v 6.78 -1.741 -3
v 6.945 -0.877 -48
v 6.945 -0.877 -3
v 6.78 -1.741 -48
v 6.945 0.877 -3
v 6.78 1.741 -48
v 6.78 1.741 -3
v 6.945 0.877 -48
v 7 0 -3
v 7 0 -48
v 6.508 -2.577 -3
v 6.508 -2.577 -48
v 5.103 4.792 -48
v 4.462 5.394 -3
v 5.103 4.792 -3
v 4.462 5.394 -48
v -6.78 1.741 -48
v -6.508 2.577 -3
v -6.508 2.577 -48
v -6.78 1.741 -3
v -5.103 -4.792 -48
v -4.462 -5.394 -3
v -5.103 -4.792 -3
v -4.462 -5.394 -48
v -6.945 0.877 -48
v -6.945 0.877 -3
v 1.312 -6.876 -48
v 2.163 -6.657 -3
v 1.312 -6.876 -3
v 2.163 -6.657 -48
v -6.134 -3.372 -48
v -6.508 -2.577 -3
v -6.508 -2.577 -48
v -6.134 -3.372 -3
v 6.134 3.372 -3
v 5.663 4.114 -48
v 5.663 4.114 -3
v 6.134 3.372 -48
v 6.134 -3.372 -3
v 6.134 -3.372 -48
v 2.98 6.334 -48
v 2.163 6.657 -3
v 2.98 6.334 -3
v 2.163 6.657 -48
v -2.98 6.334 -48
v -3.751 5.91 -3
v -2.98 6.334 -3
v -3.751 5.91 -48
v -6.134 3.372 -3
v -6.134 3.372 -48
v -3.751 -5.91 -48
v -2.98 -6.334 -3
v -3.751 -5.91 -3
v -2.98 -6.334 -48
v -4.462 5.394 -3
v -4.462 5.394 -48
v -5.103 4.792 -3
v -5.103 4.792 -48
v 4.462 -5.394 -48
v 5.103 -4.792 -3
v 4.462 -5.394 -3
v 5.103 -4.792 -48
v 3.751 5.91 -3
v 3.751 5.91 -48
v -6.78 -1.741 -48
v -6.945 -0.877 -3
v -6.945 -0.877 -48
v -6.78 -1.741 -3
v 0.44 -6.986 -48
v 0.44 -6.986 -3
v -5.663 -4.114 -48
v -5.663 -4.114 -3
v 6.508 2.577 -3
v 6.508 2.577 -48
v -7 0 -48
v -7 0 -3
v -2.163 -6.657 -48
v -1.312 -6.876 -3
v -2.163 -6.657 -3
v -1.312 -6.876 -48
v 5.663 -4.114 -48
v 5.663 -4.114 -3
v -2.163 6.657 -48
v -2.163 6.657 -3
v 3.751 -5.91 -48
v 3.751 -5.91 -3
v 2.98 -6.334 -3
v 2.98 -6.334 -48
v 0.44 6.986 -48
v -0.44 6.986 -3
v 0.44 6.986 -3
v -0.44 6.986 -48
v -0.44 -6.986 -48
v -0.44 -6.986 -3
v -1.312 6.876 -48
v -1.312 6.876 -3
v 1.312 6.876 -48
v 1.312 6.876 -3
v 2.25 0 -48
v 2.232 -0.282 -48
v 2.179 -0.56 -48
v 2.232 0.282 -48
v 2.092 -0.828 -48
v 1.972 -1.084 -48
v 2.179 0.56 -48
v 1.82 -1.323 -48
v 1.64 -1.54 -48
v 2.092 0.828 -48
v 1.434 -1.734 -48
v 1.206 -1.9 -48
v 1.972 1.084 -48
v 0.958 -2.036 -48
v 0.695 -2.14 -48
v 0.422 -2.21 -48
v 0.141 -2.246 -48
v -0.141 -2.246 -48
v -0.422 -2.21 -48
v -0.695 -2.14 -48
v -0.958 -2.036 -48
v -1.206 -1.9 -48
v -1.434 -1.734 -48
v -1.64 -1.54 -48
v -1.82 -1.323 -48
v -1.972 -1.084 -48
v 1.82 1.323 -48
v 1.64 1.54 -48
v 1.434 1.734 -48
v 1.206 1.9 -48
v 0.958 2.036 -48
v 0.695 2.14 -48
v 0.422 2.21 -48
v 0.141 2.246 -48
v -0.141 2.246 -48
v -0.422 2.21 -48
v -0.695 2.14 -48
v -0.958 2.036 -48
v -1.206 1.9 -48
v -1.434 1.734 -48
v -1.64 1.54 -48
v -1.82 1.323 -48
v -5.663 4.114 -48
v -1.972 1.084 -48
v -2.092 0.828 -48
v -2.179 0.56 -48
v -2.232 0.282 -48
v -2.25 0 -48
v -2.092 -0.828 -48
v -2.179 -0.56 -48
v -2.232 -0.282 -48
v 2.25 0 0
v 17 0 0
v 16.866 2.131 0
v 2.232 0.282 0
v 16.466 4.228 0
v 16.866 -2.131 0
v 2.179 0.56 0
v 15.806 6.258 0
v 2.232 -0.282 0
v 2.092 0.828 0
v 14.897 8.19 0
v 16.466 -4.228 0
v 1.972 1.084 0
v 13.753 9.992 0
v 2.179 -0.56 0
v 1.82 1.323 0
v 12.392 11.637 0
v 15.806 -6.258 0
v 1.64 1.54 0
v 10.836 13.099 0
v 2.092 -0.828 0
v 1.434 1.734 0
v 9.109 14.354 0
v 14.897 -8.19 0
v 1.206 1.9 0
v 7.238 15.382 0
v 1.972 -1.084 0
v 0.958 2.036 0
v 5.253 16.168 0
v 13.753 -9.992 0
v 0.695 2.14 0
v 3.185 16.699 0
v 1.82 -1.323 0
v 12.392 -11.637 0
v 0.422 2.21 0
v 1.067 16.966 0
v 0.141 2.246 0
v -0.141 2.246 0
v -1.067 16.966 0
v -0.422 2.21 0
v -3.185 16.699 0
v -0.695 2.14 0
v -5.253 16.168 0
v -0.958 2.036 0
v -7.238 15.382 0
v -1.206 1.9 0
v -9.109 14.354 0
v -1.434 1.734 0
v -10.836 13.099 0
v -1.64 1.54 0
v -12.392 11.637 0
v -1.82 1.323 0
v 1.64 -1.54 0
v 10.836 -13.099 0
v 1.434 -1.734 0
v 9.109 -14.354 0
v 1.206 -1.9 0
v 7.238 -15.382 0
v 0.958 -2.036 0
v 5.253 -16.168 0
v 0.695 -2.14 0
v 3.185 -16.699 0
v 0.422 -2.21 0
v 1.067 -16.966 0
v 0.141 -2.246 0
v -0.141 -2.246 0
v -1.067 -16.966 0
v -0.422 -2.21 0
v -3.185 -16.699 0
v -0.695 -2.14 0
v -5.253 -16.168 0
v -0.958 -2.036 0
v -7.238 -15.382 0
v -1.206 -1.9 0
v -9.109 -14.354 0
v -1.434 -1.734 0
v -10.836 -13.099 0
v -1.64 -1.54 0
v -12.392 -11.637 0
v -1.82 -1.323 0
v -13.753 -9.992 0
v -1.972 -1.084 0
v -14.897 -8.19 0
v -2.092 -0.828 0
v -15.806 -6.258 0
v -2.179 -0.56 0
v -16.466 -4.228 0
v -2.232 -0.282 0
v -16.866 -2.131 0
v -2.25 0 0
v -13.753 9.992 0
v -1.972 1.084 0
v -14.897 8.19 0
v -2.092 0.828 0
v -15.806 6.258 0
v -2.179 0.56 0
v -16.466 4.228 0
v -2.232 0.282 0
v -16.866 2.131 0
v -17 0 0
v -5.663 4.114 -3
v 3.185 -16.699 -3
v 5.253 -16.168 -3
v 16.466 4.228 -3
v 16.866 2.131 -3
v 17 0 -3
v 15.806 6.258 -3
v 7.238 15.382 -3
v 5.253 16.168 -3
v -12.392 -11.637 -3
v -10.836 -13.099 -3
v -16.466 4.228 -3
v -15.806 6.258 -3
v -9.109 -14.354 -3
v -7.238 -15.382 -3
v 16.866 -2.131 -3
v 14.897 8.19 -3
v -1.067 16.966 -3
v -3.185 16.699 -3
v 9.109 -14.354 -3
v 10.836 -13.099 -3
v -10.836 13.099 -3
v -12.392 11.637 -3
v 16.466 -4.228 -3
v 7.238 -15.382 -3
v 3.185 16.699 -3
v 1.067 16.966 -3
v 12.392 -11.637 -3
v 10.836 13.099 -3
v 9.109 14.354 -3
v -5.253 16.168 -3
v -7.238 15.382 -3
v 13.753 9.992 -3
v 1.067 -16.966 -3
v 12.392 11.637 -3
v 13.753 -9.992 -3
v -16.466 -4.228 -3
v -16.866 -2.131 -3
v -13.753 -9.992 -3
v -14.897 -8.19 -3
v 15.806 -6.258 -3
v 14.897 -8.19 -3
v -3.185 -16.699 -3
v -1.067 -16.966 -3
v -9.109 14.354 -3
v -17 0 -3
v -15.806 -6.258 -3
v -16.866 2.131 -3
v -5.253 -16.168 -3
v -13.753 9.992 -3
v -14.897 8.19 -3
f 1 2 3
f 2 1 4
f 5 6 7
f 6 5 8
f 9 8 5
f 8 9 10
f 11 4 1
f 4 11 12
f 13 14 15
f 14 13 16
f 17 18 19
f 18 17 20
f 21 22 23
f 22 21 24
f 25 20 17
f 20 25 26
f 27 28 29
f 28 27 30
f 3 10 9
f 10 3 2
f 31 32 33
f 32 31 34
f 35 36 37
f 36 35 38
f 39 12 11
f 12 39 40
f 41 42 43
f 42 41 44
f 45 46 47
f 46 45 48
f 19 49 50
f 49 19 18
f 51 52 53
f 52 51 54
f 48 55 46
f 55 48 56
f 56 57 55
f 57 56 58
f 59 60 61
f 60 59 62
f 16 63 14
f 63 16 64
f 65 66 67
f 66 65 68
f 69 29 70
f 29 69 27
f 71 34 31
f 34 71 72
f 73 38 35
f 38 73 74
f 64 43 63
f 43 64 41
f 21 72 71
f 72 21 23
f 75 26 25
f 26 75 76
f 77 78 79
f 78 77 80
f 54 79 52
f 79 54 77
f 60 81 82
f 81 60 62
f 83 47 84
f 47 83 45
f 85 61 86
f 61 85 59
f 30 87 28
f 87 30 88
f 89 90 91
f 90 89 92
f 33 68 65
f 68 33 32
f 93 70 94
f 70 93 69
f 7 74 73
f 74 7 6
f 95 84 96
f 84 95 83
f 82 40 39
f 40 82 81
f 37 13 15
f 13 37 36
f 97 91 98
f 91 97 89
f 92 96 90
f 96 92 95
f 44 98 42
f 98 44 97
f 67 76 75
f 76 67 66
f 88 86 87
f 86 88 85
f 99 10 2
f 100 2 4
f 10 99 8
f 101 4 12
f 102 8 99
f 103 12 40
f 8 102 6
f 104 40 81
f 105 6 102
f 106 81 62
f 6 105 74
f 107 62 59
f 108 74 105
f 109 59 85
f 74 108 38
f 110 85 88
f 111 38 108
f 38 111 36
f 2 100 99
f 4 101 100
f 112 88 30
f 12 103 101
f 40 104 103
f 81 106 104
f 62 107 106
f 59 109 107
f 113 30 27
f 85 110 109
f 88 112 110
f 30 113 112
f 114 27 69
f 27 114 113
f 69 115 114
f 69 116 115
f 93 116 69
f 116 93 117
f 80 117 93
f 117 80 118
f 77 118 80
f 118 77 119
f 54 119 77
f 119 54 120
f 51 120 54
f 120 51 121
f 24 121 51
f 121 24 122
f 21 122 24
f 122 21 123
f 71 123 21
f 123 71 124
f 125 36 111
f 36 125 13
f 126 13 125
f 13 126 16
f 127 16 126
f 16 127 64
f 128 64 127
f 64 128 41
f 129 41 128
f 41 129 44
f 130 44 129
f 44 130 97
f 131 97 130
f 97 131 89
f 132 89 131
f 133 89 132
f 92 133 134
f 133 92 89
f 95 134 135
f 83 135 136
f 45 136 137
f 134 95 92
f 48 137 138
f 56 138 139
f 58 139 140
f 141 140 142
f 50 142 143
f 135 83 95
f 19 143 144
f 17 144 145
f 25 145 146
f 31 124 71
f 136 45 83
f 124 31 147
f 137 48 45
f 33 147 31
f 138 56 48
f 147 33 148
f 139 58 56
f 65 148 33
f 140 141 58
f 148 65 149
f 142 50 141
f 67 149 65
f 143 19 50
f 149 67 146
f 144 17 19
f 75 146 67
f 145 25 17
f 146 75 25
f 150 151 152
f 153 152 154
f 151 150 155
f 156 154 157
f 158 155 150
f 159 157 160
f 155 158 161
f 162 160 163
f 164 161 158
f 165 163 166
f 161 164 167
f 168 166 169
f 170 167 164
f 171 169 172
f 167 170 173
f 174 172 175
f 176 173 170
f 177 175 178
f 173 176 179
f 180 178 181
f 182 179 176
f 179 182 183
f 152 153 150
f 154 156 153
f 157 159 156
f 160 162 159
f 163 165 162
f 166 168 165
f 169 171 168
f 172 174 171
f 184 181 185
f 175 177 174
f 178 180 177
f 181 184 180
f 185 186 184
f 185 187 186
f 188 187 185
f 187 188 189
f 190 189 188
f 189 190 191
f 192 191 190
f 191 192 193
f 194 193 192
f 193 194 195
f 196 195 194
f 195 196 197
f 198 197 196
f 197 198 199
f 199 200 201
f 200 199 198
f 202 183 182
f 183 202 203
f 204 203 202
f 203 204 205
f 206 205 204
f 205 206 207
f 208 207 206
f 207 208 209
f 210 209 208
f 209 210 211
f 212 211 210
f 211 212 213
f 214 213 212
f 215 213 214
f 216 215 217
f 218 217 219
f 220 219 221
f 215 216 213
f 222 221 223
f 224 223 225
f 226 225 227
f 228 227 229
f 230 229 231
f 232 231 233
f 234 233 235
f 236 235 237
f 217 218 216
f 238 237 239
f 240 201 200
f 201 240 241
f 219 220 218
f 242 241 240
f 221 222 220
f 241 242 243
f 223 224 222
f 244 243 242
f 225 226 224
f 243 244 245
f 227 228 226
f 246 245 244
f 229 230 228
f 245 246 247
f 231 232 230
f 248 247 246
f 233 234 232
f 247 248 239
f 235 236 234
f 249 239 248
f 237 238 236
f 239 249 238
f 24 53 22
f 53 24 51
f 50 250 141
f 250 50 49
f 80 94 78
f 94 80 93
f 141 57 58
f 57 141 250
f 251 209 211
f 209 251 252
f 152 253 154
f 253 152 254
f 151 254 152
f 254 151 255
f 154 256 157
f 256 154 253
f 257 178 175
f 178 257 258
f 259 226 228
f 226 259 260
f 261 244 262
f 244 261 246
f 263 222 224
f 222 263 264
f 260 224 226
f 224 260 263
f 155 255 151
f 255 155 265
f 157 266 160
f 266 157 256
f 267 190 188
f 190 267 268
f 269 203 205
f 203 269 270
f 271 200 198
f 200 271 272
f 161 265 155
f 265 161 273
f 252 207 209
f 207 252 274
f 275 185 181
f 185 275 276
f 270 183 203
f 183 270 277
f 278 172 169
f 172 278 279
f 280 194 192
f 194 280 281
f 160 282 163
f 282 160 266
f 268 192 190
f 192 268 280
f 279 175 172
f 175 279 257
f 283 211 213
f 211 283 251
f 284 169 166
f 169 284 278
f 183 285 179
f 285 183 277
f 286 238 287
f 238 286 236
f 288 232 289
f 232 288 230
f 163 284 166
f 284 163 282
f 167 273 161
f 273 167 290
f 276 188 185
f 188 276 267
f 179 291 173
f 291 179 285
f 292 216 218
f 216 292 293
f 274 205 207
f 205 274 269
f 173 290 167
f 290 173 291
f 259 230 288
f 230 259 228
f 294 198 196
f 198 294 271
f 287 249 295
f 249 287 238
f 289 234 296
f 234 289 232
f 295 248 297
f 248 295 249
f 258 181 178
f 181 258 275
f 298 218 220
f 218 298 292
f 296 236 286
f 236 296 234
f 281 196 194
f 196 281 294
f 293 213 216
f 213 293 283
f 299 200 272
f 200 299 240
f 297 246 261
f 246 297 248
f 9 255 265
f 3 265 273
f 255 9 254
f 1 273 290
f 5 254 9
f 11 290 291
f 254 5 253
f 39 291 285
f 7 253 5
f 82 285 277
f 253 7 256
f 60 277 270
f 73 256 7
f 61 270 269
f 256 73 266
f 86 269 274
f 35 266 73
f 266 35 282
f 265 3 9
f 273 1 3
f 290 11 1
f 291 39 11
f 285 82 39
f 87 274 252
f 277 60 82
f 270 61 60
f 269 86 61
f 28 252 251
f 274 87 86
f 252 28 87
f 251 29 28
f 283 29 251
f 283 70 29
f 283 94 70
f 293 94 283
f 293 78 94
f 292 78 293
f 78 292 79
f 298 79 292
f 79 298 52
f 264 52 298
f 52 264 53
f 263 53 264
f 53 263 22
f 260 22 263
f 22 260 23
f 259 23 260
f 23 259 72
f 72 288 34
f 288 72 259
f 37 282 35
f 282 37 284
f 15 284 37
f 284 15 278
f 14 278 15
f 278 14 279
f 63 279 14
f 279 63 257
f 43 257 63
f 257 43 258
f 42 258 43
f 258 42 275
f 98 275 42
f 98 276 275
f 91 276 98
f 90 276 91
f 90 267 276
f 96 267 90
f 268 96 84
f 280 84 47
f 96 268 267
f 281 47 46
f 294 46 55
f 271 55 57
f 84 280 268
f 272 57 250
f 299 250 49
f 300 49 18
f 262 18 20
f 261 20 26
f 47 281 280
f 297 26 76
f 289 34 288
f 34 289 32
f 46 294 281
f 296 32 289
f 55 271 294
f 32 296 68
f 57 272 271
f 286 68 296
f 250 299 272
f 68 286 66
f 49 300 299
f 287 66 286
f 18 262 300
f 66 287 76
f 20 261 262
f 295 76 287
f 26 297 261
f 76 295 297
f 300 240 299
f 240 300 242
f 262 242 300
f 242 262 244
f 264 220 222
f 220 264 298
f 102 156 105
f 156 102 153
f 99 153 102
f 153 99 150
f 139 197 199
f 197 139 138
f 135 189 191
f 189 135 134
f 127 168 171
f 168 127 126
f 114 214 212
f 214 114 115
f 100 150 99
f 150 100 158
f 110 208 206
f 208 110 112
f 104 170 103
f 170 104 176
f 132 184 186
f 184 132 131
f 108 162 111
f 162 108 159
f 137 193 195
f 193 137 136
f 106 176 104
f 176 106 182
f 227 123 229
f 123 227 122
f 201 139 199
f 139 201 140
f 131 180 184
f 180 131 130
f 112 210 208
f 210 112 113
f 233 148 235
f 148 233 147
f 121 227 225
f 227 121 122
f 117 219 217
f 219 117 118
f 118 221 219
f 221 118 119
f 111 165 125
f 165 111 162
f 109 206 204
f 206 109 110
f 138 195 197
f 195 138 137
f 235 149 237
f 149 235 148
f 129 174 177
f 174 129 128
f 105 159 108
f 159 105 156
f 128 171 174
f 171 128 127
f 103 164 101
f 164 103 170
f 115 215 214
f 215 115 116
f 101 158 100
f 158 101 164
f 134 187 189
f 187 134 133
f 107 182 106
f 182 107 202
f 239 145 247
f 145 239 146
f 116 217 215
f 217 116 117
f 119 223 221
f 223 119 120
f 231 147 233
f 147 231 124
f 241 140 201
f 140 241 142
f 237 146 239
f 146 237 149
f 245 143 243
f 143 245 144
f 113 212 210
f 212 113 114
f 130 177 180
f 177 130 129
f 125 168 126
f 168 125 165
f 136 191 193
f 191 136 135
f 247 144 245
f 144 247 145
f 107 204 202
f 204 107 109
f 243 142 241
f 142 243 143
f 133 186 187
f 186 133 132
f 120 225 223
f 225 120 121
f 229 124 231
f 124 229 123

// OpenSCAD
$fn = 50;


difference() {
	union() {
		translate(v = [0, 0, -48.0000000000]) {
			cylinder(h = 48, r = 7.0000000000);
		}
		translate(v = [0, 0, -3.0000000000]) {
			cylinder(h = 3, r = 17.0000000000);
		}
	}
	union() {
		#translate(v = [0, 0, -48]) {
			cylinder(h = 48, r = 2.2500000000);
		}
	}
}
